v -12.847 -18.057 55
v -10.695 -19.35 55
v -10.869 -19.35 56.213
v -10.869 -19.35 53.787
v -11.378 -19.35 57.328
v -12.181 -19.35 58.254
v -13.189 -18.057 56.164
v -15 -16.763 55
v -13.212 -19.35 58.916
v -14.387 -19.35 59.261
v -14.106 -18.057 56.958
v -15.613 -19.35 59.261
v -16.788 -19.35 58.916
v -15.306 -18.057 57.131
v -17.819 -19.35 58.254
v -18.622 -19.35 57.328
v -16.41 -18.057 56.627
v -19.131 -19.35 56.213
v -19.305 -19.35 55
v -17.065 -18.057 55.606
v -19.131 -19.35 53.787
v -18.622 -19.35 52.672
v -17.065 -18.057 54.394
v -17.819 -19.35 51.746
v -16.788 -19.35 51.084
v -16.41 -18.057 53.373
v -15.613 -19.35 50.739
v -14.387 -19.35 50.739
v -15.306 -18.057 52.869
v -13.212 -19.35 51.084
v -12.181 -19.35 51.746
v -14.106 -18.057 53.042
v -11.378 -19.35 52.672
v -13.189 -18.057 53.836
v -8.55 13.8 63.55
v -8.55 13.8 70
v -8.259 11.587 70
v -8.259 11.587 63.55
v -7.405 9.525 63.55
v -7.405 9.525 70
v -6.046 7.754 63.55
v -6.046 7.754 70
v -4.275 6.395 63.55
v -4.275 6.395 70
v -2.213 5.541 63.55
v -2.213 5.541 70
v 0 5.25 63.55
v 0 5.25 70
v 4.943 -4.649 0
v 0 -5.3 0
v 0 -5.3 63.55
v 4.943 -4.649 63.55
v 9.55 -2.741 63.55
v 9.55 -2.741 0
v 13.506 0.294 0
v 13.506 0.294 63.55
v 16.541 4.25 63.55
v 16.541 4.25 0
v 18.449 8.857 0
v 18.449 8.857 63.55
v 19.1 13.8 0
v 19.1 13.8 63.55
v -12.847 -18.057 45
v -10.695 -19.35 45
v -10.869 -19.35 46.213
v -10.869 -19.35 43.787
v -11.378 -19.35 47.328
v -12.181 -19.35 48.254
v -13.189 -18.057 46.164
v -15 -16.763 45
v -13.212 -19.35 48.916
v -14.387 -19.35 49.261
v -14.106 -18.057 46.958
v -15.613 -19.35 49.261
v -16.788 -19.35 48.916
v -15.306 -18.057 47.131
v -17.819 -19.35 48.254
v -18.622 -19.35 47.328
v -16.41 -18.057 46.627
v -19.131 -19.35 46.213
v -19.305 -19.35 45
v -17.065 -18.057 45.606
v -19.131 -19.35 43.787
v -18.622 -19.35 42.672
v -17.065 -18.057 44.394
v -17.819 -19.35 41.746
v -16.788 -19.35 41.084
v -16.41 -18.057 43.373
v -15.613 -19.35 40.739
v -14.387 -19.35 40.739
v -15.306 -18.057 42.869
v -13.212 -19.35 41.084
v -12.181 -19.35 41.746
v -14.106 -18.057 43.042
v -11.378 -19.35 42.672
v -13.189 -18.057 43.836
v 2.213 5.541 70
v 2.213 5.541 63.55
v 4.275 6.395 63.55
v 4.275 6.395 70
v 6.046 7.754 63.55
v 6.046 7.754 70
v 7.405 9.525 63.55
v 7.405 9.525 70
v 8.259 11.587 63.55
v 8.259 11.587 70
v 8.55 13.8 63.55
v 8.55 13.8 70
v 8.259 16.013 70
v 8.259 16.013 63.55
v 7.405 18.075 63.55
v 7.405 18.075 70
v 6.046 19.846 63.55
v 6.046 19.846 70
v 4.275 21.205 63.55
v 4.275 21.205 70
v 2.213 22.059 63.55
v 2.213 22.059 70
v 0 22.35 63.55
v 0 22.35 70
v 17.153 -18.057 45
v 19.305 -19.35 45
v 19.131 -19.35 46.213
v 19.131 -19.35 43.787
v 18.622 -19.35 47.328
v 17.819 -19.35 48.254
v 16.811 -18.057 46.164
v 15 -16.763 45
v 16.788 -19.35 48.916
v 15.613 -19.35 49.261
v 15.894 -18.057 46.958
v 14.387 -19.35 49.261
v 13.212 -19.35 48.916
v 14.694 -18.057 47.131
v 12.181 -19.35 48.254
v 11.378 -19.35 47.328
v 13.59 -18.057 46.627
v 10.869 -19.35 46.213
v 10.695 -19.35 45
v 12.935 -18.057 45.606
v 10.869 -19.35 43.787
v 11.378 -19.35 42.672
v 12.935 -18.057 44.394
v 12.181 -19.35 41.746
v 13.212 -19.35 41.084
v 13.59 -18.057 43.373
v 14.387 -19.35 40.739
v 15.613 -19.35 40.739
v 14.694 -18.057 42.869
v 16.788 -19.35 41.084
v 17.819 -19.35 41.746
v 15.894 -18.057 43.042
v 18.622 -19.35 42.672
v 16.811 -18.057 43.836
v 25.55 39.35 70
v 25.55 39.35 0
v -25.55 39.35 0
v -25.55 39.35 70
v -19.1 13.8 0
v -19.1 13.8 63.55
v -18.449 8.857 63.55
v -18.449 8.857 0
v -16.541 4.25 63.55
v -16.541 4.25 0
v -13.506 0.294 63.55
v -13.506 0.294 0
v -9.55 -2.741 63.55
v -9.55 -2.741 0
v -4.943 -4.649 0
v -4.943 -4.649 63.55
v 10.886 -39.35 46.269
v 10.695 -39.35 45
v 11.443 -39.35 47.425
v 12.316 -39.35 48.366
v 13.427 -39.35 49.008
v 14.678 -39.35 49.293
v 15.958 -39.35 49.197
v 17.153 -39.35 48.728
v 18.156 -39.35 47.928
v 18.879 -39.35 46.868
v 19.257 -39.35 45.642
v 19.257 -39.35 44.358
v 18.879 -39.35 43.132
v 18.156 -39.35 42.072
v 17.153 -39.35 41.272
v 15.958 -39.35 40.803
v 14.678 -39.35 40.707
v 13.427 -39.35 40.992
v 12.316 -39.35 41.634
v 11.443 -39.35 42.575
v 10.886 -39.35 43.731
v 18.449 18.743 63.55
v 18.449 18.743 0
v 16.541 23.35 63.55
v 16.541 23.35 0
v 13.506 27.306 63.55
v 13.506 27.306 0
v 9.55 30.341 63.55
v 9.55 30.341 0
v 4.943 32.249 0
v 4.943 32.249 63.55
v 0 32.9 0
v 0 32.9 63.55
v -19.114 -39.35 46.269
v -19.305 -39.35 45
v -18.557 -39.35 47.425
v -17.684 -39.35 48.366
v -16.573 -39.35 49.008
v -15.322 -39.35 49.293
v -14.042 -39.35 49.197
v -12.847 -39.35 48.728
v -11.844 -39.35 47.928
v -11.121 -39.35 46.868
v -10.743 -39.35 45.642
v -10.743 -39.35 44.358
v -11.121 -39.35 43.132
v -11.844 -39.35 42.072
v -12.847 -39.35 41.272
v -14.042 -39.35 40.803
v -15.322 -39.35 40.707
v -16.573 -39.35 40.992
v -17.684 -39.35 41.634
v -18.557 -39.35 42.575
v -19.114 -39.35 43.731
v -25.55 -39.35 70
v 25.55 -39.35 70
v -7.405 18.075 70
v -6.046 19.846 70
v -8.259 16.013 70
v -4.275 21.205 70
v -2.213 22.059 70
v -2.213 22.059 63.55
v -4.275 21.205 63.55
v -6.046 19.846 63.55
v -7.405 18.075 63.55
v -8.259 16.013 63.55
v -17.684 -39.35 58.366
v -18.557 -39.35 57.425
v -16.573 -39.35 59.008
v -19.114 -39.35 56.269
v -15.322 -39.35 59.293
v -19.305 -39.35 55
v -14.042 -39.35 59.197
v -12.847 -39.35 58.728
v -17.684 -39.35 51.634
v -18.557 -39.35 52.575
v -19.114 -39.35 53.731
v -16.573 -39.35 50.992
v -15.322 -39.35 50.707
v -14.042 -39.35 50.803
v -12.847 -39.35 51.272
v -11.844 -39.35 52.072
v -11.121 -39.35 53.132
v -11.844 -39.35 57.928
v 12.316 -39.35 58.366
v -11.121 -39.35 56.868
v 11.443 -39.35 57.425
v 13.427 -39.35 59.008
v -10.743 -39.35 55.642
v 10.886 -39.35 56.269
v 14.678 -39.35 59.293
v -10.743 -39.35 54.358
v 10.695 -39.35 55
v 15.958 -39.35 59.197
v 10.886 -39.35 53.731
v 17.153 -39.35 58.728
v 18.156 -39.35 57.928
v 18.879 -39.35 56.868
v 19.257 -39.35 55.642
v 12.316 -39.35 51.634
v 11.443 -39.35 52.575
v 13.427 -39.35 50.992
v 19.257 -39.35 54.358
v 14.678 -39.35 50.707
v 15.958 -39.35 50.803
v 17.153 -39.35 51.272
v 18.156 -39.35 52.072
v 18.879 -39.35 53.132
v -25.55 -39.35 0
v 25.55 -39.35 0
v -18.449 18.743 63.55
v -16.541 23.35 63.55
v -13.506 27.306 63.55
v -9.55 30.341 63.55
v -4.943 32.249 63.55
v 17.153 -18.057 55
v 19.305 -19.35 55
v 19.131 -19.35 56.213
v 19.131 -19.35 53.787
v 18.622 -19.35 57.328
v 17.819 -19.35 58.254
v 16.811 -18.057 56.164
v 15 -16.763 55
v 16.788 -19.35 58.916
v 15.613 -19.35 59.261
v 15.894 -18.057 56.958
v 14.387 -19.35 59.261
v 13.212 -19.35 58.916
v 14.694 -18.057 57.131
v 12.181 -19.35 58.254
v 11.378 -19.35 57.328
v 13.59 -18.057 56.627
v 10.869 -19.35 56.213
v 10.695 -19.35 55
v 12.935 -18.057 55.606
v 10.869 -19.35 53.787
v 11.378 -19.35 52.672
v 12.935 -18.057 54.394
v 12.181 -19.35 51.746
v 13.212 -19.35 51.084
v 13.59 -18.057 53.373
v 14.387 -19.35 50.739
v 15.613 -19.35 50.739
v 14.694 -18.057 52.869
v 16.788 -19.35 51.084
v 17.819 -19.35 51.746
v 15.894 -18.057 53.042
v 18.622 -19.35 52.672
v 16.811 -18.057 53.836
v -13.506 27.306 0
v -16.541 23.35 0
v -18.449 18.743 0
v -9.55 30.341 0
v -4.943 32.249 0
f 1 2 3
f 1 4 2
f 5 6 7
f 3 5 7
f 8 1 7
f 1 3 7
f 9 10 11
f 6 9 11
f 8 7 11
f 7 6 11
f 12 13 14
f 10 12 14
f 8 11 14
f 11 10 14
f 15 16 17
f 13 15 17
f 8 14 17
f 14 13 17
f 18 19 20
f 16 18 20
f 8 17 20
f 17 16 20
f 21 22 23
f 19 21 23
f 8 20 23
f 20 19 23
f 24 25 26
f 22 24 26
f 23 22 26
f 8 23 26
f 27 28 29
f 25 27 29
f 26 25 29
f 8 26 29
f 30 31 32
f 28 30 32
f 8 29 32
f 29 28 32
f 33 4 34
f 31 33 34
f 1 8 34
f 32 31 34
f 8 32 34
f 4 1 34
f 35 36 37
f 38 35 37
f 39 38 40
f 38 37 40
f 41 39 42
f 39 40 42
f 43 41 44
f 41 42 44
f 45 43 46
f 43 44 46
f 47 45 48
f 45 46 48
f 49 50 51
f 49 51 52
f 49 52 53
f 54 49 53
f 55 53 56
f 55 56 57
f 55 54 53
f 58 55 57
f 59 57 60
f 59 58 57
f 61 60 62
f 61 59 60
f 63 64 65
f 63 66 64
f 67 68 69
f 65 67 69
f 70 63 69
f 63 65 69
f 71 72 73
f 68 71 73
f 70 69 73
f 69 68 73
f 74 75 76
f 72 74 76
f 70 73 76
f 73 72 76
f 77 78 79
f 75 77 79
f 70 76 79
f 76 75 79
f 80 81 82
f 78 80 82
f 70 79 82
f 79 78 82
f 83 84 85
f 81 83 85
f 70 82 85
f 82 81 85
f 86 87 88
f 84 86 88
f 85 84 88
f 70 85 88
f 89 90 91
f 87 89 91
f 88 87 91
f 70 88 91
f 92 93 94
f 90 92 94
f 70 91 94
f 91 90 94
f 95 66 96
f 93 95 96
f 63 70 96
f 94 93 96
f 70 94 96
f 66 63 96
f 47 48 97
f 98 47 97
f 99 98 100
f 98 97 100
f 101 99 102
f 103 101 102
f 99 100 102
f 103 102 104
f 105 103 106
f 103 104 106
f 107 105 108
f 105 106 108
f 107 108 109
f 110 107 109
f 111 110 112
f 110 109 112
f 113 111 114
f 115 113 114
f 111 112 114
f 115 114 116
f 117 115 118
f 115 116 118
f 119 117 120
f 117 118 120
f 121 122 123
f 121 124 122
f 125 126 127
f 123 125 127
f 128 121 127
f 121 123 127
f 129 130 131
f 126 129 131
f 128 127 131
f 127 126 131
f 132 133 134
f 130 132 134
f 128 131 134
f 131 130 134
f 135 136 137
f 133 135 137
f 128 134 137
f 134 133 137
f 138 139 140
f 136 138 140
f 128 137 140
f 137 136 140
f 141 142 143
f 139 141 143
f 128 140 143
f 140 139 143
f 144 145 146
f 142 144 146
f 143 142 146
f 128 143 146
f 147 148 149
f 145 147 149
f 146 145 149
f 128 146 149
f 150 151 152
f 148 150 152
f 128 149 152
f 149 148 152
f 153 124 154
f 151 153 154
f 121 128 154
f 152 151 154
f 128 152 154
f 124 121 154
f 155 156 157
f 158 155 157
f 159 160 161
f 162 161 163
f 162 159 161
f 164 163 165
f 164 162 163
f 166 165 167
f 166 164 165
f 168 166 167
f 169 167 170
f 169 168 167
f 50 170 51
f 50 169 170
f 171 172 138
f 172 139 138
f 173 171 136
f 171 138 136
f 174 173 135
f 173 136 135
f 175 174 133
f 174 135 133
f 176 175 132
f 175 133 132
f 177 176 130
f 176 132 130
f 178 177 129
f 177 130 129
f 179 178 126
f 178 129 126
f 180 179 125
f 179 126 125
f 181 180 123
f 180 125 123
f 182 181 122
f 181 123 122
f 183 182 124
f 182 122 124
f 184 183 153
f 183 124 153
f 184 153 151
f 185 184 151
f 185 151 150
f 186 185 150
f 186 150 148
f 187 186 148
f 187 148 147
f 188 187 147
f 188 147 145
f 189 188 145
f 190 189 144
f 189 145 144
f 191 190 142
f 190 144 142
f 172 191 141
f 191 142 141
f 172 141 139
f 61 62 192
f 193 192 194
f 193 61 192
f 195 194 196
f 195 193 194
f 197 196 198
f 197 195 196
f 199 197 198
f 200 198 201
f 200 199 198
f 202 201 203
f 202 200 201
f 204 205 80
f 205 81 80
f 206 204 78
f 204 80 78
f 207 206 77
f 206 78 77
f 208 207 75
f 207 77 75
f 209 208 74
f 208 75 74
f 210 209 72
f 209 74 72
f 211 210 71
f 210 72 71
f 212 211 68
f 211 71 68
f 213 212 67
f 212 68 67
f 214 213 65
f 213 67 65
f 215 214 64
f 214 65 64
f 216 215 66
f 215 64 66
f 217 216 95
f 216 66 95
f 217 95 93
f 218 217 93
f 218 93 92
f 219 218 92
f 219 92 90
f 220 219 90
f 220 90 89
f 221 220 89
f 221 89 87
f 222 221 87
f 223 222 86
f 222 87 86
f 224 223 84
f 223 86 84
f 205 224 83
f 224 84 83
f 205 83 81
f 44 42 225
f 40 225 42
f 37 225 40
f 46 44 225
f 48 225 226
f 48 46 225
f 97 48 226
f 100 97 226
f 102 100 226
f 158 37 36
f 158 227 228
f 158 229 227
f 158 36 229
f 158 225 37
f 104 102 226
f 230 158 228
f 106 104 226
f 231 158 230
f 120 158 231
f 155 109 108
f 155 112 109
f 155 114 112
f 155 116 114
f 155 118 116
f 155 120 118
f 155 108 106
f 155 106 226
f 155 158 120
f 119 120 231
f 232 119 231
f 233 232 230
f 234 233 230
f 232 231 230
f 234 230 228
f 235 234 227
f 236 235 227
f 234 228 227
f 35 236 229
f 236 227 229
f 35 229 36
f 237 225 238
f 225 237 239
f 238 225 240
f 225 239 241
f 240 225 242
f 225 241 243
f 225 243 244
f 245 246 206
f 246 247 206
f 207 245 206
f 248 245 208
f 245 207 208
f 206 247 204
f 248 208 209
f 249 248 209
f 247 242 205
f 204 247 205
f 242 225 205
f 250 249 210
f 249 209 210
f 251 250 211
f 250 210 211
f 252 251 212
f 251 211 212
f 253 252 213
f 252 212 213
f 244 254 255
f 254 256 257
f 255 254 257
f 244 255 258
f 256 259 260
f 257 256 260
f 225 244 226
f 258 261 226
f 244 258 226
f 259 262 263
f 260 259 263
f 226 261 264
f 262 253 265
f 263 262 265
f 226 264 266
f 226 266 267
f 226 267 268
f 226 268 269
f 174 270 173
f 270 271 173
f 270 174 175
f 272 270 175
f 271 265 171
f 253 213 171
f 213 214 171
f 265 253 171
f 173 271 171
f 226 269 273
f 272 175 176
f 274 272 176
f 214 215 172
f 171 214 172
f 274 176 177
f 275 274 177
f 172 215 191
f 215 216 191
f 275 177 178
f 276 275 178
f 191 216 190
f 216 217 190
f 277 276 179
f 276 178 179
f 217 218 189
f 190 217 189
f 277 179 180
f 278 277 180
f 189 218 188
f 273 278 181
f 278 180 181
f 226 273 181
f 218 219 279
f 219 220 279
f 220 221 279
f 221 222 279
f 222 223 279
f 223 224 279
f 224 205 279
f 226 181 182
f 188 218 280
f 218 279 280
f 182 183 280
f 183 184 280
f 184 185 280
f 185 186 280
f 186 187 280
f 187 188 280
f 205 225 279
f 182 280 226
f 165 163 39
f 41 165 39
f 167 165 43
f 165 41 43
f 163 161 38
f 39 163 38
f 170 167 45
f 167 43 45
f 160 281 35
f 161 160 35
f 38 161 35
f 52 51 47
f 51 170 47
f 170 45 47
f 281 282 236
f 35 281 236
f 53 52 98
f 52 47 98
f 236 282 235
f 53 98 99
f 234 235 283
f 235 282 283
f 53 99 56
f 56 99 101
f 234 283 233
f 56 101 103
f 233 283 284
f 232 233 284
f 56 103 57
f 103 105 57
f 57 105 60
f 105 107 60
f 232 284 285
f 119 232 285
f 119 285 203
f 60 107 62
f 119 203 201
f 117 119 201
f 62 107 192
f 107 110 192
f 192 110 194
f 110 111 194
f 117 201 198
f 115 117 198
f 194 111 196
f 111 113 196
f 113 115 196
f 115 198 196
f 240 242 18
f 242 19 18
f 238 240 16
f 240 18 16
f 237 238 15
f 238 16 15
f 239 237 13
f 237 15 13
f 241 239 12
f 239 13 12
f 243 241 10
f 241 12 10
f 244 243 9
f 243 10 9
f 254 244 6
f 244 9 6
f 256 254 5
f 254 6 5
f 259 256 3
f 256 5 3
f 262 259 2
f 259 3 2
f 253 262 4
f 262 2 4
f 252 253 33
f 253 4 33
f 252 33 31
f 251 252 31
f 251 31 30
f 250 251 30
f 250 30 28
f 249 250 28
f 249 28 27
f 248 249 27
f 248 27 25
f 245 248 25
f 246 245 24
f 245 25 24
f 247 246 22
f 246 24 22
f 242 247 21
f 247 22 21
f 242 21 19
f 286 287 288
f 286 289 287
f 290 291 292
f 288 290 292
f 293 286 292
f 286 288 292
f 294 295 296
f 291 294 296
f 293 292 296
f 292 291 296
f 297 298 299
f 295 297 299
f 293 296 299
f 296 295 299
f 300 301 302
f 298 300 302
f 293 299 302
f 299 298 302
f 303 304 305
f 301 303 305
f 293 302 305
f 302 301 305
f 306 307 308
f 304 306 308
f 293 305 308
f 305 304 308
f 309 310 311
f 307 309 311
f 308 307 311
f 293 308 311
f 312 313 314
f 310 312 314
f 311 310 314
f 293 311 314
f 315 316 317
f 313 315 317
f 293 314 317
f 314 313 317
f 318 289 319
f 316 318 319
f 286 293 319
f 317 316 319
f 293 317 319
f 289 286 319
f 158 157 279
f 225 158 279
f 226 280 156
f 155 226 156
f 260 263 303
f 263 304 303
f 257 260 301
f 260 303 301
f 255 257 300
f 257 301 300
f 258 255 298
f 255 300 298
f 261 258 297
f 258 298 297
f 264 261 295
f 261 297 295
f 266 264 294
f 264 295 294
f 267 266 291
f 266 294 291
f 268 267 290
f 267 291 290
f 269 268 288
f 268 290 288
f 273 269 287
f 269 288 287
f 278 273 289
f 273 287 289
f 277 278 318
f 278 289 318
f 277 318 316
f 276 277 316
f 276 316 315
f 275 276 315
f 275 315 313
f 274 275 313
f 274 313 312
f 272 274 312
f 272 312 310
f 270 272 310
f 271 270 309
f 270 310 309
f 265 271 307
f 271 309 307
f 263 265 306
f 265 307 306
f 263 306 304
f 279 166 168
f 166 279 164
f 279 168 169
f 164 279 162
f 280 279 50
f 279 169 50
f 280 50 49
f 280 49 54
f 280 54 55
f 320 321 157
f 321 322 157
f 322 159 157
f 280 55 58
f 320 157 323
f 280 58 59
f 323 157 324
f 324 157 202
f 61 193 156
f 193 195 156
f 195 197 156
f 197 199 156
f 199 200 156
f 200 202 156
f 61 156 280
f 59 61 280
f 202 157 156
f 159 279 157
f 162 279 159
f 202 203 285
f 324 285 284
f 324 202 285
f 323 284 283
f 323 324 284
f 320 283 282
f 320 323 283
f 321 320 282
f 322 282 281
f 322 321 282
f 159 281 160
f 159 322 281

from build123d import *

# Parameters (mm, degrees)
F1_DEPTH = 70
F3_DEPTH = 63.55
F4_DEPTH = 6.45
F6_D     = 8.6106
F6_DEPTH = 20
F6_TIP   = 2.5868852231


with BuildPart() as f1:
    # F0 (on Top) → F1 (new body)
    with BuildSketch(Plane.XY):
        with BuildLine():
            Line((0, -39.35), (25.55, -39.35))
            Line((25.55, -39.35), (25.55, 13.8))
            Line((25.55, 13.8), (19.1, 13.8))
            ThreePointArc((19.1, 13.8), (13.5057395207, 0.2942604793), (0, -5.3))
            Line((0, -5.3), (0, -39.35))
        make_face()
        with BuildLine():
            Line((-25.55, -39.35), (0, -39.35))
            Line((0, -39.35), (0, -5.3))
            ThreePointArc((0, -5.3), (-13.5057395207, 0.2942604793), (-19.1, 13.8))
            Line((-19.1, 13.8), (-25.55, 13.8))
            Line((-25.55, 13.8), (-25.55, -39.35))
        make_face()
        with BuildLine():
            Line((19.1, 13.8), (25.55, 13.8))
            Line((25.55, 13.8), (25.55, 39.35))
            Line((25.55, 39.35), (0, 39.35))
            Line((0, 39.35), (0, 32.9))
            ThreePointArc((0, 32.9), (13.5057395207, 27.3057395207), (19.1, 13.8))
        make_face()
        with BuildLine():
            Line((-25.55, 39.35), (-25.55, 13.8))
            Line((-25.55, 13.8), (-19.1, 13.8))
            ThreePointArc((-19.1, 13.8), (-13.5057395207, 27.3057395207), (0, 32.9))
            Line((0, 32.9), (0, 39.35))
            Line((0, 39.35), (-25.55, 39.35))
        make_face()
        with BuildLine():
            Line((0, 13.8), (19.1, 13.8))
            ThreePointArc((19.1, 13.8), (13.5057395207, 27.3057395207), (0, 32.9))
            Line((0, 32.9), (0, 13.8))
        make_face()
        with BuildLine():
            Line((0, 13.8), (0, -5.3))
            ThreePointArc((0, -5.3), (13.5057395207, 0.2942604793), (19.1, 13.8))
            Line((19.1, 13.8), (0, 13.8))
        make_face()
        with BuildLine():
            ThreePointArc((-19.1, 13.8), (-13.5057395207, 0.2942604793), (0, -5.3))
            Line((0, -5.3), (0, 13.8))
            Line((0, 13.8), (-19.1, 13.8))
        make_face()
        with BuildLine():
            Line((-19.1, 13.8), (0, 13.8))
            Line((0, 13.8), (0, 32.9))
            ThreePointArc((0, 32.9), (-13.5057395207, 27.3057395207), (-19.1, 13.8))
        make_face()
    extrude(amount=F1_DEPTH)

    # F0 (on Top) → F3 (cut)
    with BuildSketch(Plane.XY):
        with BuildLine():
            Line((-19.1, 13.8), (0, 13.8))
            Line((0, 13.8), (0, 32.9))
            ThreePointArc((0, 32.9), (-13.5057395207, 27.3057395207), (-19.1, 13.8))
        make_face()
        with BuildLine():
            Line((0, 13.8), (19.1, 13.8))
            ThreePointArc((19.1, 13.8), (13.5057395207, 27.3057395207), (0, 32.9))
            Line((0, 32.9), (0, 13.8))
        make_face()
        with BuildLine():
            Line((0, 13.8), (0, -5.3))
            ThreePointArc((0, -5.3), (13.5057395207, 0.2942604793), (19.1, 13.8))
            Line((19.1, 13.8), (0, 13.8))
        make_face()
        with BuildLine():
            ThreePointArc((-19.1, 13.8), (-13.5057395207, 0.2942604793), (0, -5.3))
            Line((0, -5.3), (0, 13.8))
            Line((0, 13.8), (-19.1, 13.8))
        make_face()
    extrude(amount=F3_DEPTH, mode=Mode.SUBTRACT)

    # F2 (on face) → F4 (cut)
    with BuildSketch(Plane.XY.offset(70)):
        with BuildLine():
            Line((0, 5.25), (0, 13.8))
            Line((0, 13.8), (-8.55, 13.8))
            ThreePointArc((-8.55, 13.8), (-6.0457629791, 7.7542370209), (0, 5.25))
        make_face()
        with BuildLine():
            Line((8.55, 13.8), (0, 13.8))
            Line((0, 13.8), (0, 5.25))
            ThreePointArc((0, 5.25), (6.0457629791, 7.7542370209), (8.55, 13.8))
        make_face()
        with BuildLine():
            ThreePointArc((8.55, 13.8), (6.0457629791, 19.8457629791), (0, 22.35))
            Line((0, 22.35), (0, 13.8))
            Line((0, 13.8), (8.55, 13.8))
        make_face()
        with BuildLine():
            Line((0, 13.8), (0, 22.35))
            ThreePointArc((0, 22.35), (-6.0457629791, 19.8457629791), (-8.55, 13.8))
            Line((-8.55, 13.8), (0, 13.8))
        make_face()
    extrude(amount=-F4_DEPTH, mode=Mode.SUBTRACT)

    # F6
    with Locations(Plane.XZ.offset(39.35)):
        with Locations((-15, 55), (15, 55), (15, 45), (-15, 45)):
            Hole(F6_D / 2, depth=F6_DEPTH)
            with Locations((0, 0, -(F6_DEPTH + F6_TIP / 2))):  # 118° drill point
                Cone(0, F6_D / 2, F6_TIP, mode=Mode.SUBTRACT)


solid = f1.part
